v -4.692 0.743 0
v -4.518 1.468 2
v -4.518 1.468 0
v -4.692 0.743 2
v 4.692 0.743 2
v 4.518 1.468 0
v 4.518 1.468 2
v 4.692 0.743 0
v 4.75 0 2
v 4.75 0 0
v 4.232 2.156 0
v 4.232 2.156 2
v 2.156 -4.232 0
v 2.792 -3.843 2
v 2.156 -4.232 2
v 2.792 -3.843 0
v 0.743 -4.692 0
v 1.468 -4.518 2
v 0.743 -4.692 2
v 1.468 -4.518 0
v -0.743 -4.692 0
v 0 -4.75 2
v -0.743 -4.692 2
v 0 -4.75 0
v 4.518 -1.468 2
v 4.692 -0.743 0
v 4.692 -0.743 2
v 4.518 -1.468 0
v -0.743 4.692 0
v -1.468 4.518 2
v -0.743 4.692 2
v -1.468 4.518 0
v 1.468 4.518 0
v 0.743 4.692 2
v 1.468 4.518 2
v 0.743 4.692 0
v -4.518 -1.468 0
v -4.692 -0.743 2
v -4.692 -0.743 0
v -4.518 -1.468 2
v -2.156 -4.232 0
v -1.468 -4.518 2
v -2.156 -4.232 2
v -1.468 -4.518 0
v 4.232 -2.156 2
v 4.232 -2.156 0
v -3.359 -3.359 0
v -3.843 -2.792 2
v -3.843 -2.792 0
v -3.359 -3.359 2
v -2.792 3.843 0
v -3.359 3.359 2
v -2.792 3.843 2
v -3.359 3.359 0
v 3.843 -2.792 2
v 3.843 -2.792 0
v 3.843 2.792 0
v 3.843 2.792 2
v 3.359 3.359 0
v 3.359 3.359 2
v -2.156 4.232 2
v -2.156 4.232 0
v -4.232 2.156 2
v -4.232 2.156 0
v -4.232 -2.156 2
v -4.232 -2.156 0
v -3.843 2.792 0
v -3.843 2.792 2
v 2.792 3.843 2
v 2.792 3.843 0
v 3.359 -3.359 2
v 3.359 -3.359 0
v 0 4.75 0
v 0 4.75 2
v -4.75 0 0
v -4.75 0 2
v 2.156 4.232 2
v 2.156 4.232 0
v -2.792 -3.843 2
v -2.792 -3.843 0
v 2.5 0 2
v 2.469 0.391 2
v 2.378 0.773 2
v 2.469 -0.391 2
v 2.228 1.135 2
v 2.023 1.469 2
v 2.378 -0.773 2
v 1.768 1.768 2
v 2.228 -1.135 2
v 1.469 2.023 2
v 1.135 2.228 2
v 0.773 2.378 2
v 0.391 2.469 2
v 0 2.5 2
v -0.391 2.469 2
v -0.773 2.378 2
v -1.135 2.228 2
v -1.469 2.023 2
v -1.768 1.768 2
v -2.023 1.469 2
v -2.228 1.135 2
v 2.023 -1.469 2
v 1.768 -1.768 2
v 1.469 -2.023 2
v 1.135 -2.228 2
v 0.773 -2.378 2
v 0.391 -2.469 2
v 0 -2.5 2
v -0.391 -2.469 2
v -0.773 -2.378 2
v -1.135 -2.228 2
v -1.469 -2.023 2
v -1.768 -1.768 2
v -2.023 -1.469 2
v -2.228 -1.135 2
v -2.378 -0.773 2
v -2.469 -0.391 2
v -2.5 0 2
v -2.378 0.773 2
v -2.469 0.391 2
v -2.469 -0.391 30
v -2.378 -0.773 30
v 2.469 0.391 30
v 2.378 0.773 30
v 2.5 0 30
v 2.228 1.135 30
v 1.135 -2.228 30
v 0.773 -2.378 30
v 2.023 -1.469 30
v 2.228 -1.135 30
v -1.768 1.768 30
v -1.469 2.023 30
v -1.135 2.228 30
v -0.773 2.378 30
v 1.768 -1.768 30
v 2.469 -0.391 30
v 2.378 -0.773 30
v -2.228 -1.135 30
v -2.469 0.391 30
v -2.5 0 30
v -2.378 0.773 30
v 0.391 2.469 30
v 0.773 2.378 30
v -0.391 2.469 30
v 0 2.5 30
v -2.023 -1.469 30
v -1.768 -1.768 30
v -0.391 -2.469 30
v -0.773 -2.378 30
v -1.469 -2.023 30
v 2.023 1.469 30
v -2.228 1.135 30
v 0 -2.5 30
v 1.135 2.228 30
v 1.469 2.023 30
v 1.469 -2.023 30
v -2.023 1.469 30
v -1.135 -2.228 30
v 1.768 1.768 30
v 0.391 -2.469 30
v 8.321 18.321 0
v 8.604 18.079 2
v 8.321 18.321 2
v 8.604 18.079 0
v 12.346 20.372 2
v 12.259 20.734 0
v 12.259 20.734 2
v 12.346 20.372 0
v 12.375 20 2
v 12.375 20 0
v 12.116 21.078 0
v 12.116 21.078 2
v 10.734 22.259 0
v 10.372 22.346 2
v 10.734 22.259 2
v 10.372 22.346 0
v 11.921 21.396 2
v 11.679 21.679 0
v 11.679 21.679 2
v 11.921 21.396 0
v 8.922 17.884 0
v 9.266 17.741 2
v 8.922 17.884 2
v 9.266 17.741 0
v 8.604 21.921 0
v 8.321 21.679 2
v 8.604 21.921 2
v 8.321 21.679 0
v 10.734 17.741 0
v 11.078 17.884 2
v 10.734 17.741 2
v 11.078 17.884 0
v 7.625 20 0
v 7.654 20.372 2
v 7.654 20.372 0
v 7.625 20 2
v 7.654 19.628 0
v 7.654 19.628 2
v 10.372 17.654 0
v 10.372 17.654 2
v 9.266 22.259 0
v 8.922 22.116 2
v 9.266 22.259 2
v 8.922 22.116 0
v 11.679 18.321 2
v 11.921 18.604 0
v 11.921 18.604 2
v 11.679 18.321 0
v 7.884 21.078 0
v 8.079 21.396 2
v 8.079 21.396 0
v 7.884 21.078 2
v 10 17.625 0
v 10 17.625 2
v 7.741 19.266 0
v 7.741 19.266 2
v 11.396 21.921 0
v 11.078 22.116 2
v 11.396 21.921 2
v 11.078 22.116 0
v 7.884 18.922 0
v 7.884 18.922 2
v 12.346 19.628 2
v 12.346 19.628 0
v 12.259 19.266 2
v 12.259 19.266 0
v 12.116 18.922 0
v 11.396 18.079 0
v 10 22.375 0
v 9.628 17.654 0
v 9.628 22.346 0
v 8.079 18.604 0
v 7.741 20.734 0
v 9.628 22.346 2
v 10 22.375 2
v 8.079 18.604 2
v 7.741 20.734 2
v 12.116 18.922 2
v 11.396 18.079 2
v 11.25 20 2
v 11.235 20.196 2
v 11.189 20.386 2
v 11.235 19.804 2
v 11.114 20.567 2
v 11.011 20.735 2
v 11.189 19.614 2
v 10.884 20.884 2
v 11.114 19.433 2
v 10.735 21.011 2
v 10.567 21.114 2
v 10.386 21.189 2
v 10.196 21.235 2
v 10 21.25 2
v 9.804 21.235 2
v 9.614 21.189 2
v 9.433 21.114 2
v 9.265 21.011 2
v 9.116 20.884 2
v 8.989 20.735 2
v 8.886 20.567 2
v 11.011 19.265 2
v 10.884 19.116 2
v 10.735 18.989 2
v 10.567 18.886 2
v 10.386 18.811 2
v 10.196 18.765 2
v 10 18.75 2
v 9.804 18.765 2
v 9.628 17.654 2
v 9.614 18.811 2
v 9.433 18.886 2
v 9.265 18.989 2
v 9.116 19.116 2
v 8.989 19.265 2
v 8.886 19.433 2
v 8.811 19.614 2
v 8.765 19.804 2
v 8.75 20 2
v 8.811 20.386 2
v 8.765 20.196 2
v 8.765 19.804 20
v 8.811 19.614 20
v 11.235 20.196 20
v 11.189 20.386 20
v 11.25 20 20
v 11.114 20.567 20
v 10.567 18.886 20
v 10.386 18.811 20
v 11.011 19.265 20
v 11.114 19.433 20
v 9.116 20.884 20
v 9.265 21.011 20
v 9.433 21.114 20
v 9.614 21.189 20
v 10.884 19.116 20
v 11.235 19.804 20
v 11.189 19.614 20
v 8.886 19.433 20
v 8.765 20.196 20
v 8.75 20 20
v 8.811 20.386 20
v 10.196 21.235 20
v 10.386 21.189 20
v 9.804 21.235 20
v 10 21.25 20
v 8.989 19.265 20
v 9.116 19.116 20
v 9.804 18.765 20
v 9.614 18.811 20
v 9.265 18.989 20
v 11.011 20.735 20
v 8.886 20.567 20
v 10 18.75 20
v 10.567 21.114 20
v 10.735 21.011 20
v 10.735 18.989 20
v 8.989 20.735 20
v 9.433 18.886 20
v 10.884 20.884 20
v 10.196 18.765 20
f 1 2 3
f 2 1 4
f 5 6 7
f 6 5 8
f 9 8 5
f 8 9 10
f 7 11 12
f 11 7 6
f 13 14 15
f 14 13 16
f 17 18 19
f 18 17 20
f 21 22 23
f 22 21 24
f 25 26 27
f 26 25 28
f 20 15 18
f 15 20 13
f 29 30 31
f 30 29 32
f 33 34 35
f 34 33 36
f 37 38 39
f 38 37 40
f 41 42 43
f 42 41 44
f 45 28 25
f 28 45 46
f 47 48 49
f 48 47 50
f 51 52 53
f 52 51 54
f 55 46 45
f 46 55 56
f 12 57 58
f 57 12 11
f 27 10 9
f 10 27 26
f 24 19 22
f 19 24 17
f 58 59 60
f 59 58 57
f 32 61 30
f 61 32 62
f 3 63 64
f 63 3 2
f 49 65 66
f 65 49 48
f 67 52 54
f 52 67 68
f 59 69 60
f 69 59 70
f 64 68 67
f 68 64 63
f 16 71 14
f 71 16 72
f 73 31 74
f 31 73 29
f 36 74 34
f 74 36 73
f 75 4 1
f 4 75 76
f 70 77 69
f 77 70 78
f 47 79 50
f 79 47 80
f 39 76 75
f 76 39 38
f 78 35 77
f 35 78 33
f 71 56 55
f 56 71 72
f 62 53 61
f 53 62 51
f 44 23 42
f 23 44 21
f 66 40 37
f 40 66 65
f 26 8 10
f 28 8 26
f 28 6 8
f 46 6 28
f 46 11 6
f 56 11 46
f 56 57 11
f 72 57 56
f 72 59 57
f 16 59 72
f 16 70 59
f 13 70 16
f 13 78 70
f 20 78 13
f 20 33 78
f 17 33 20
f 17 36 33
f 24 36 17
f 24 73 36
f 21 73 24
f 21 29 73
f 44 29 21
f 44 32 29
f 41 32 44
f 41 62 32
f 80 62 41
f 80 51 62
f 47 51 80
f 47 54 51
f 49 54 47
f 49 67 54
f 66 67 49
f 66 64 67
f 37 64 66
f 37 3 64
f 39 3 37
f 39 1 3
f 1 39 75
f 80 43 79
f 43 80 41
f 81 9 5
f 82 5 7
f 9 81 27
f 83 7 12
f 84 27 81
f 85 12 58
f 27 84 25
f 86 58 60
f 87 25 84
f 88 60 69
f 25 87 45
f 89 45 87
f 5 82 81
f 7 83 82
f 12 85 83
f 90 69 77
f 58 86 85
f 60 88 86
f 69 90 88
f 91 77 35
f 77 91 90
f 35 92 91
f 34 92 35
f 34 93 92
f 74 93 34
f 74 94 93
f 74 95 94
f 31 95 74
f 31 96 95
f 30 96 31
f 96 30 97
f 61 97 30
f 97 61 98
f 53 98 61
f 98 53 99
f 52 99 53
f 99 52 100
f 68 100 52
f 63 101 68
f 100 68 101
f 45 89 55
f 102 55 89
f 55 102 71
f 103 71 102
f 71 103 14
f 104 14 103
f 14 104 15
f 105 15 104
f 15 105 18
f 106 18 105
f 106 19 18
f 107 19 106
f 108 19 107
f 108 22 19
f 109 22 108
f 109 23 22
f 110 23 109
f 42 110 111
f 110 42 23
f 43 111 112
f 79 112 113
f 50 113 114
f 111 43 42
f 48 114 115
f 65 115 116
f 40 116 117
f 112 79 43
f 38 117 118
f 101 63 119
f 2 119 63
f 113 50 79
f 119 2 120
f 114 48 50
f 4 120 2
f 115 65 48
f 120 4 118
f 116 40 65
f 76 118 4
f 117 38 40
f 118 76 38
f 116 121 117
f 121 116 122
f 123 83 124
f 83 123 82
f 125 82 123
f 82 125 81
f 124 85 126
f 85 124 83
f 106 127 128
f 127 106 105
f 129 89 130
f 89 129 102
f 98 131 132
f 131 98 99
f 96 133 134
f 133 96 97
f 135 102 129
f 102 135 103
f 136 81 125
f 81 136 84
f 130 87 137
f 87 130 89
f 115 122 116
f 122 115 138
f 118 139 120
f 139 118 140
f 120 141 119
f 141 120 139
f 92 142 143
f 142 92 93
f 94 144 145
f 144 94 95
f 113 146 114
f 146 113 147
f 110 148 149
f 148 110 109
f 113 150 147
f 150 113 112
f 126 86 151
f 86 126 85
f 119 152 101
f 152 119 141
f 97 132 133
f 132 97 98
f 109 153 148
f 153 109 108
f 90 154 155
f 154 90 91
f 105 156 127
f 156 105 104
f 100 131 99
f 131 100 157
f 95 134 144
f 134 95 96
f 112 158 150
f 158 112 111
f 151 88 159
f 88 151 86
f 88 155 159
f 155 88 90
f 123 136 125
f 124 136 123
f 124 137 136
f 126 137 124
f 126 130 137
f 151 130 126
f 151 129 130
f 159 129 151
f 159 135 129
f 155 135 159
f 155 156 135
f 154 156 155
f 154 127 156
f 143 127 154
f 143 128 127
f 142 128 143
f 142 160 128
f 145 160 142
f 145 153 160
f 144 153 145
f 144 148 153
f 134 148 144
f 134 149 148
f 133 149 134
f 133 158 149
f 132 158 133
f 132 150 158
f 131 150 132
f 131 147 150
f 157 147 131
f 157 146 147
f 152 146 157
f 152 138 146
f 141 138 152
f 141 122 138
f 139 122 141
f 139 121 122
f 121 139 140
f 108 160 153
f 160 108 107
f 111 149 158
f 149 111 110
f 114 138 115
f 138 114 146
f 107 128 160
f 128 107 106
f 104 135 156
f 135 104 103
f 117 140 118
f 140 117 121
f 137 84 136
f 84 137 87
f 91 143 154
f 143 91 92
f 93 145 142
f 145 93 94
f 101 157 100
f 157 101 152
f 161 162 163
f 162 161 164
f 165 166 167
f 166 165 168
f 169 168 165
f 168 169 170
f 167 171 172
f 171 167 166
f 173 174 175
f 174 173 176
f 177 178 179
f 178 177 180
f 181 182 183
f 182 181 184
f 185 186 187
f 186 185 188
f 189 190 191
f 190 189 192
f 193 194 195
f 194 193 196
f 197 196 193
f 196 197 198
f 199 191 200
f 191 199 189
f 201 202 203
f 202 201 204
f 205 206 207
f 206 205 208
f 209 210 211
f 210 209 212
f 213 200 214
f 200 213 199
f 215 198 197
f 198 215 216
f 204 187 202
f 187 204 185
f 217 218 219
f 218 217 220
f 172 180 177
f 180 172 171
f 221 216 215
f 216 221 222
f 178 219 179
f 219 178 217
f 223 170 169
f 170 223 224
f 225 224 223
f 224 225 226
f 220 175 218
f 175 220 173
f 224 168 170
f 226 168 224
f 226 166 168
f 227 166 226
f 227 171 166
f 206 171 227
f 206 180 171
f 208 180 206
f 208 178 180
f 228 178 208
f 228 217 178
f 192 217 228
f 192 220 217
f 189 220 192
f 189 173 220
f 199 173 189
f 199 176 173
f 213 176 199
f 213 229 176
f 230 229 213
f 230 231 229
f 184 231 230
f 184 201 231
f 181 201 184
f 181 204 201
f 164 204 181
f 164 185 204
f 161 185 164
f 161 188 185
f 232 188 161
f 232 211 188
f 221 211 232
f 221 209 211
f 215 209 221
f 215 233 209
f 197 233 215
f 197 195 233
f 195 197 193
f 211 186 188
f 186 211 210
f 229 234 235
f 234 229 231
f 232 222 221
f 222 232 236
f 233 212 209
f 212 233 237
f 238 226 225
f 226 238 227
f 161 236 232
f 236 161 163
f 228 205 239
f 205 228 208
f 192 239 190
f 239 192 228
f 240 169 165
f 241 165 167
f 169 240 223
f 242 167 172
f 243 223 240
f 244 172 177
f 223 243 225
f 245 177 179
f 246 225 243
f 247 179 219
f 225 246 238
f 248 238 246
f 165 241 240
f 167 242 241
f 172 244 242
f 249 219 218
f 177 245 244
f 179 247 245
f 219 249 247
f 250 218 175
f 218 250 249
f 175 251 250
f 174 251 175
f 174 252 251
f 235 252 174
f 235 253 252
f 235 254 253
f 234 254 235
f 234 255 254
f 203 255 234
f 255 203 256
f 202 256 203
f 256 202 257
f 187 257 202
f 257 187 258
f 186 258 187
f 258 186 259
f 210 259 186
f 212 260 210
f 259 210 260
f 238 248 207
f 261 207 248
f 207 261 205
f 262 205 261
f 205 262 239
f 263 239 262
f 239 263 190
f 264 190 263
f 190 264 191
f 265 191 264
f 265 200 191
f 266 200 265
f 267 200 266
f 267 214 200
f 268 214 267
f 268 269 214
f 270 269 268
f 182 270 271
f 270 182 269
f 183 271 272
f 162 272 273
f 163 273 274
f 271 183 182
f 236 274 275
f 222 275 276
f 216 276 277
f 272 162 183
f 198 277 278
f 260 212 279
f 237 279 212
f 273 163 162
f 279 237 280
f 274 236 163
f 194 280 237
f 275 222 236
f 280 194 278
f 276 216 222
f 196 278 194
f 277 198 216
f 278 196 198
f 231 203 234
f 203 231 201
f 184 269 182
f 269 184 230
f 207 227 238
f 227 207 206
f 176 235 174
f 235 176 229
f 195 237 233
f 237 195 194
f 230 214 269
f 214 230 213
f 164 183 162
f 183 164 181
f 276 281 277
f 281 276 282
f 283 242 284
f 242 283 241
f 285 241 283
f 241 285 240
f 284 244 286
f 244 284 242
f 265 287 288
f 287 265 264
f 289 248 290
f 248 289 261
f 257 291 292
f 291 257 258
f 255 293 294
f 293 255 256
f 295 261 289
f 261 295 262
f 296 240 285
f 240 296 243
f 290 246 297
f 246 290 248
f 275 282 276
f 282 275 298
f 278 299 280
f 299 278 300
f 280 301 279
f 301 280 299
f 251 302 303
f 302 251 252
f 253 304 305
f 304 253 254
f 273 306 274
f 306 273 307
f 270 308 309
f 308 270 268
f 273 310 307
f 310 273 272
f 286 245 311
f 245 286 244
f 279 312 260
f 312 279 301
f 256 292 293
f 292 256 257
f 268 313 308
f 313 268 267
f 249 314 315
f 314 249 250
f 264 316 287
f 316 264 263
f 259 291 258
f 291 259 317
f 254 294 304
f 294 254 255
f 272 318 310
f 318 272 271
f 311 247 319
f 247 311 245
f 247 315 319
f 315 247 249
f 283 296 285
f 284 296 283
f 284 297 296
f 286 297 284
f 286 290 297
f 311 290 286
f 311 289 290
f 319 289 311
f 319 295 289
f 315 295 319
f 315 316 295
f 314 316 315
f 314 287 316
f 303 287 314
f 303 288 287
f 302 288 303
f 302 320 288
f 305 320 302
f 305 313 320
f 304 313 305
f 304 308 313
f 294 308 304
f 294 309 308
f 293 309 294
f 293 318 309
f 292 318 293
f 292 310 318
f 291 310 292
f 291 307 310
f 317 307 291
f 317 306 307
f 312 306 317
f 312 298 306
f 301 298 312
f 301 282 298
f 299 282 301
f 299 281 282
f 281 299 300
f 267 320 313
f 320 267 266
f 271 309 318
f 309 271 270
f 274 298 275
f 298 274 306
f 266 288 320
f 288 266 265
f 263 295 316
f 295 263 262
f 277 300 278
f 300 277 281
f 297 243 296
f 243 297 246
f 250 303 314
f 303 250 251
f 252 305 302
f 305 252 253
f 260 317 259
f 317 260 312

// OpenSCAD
screw_blablawhatervericallit(30,5);
translate([10,20,0]) screw_blablawhatervericallit(20,2.5);


module screw_blablawhatervericallit(screw_height=20,diameter=3) {
    union() {
        cylinder(h=2,r=(diameter/2)*1.9,$fn=40);
        cylinder(h=screw_height,r=diameter/2,$fn=40);
    }
}
